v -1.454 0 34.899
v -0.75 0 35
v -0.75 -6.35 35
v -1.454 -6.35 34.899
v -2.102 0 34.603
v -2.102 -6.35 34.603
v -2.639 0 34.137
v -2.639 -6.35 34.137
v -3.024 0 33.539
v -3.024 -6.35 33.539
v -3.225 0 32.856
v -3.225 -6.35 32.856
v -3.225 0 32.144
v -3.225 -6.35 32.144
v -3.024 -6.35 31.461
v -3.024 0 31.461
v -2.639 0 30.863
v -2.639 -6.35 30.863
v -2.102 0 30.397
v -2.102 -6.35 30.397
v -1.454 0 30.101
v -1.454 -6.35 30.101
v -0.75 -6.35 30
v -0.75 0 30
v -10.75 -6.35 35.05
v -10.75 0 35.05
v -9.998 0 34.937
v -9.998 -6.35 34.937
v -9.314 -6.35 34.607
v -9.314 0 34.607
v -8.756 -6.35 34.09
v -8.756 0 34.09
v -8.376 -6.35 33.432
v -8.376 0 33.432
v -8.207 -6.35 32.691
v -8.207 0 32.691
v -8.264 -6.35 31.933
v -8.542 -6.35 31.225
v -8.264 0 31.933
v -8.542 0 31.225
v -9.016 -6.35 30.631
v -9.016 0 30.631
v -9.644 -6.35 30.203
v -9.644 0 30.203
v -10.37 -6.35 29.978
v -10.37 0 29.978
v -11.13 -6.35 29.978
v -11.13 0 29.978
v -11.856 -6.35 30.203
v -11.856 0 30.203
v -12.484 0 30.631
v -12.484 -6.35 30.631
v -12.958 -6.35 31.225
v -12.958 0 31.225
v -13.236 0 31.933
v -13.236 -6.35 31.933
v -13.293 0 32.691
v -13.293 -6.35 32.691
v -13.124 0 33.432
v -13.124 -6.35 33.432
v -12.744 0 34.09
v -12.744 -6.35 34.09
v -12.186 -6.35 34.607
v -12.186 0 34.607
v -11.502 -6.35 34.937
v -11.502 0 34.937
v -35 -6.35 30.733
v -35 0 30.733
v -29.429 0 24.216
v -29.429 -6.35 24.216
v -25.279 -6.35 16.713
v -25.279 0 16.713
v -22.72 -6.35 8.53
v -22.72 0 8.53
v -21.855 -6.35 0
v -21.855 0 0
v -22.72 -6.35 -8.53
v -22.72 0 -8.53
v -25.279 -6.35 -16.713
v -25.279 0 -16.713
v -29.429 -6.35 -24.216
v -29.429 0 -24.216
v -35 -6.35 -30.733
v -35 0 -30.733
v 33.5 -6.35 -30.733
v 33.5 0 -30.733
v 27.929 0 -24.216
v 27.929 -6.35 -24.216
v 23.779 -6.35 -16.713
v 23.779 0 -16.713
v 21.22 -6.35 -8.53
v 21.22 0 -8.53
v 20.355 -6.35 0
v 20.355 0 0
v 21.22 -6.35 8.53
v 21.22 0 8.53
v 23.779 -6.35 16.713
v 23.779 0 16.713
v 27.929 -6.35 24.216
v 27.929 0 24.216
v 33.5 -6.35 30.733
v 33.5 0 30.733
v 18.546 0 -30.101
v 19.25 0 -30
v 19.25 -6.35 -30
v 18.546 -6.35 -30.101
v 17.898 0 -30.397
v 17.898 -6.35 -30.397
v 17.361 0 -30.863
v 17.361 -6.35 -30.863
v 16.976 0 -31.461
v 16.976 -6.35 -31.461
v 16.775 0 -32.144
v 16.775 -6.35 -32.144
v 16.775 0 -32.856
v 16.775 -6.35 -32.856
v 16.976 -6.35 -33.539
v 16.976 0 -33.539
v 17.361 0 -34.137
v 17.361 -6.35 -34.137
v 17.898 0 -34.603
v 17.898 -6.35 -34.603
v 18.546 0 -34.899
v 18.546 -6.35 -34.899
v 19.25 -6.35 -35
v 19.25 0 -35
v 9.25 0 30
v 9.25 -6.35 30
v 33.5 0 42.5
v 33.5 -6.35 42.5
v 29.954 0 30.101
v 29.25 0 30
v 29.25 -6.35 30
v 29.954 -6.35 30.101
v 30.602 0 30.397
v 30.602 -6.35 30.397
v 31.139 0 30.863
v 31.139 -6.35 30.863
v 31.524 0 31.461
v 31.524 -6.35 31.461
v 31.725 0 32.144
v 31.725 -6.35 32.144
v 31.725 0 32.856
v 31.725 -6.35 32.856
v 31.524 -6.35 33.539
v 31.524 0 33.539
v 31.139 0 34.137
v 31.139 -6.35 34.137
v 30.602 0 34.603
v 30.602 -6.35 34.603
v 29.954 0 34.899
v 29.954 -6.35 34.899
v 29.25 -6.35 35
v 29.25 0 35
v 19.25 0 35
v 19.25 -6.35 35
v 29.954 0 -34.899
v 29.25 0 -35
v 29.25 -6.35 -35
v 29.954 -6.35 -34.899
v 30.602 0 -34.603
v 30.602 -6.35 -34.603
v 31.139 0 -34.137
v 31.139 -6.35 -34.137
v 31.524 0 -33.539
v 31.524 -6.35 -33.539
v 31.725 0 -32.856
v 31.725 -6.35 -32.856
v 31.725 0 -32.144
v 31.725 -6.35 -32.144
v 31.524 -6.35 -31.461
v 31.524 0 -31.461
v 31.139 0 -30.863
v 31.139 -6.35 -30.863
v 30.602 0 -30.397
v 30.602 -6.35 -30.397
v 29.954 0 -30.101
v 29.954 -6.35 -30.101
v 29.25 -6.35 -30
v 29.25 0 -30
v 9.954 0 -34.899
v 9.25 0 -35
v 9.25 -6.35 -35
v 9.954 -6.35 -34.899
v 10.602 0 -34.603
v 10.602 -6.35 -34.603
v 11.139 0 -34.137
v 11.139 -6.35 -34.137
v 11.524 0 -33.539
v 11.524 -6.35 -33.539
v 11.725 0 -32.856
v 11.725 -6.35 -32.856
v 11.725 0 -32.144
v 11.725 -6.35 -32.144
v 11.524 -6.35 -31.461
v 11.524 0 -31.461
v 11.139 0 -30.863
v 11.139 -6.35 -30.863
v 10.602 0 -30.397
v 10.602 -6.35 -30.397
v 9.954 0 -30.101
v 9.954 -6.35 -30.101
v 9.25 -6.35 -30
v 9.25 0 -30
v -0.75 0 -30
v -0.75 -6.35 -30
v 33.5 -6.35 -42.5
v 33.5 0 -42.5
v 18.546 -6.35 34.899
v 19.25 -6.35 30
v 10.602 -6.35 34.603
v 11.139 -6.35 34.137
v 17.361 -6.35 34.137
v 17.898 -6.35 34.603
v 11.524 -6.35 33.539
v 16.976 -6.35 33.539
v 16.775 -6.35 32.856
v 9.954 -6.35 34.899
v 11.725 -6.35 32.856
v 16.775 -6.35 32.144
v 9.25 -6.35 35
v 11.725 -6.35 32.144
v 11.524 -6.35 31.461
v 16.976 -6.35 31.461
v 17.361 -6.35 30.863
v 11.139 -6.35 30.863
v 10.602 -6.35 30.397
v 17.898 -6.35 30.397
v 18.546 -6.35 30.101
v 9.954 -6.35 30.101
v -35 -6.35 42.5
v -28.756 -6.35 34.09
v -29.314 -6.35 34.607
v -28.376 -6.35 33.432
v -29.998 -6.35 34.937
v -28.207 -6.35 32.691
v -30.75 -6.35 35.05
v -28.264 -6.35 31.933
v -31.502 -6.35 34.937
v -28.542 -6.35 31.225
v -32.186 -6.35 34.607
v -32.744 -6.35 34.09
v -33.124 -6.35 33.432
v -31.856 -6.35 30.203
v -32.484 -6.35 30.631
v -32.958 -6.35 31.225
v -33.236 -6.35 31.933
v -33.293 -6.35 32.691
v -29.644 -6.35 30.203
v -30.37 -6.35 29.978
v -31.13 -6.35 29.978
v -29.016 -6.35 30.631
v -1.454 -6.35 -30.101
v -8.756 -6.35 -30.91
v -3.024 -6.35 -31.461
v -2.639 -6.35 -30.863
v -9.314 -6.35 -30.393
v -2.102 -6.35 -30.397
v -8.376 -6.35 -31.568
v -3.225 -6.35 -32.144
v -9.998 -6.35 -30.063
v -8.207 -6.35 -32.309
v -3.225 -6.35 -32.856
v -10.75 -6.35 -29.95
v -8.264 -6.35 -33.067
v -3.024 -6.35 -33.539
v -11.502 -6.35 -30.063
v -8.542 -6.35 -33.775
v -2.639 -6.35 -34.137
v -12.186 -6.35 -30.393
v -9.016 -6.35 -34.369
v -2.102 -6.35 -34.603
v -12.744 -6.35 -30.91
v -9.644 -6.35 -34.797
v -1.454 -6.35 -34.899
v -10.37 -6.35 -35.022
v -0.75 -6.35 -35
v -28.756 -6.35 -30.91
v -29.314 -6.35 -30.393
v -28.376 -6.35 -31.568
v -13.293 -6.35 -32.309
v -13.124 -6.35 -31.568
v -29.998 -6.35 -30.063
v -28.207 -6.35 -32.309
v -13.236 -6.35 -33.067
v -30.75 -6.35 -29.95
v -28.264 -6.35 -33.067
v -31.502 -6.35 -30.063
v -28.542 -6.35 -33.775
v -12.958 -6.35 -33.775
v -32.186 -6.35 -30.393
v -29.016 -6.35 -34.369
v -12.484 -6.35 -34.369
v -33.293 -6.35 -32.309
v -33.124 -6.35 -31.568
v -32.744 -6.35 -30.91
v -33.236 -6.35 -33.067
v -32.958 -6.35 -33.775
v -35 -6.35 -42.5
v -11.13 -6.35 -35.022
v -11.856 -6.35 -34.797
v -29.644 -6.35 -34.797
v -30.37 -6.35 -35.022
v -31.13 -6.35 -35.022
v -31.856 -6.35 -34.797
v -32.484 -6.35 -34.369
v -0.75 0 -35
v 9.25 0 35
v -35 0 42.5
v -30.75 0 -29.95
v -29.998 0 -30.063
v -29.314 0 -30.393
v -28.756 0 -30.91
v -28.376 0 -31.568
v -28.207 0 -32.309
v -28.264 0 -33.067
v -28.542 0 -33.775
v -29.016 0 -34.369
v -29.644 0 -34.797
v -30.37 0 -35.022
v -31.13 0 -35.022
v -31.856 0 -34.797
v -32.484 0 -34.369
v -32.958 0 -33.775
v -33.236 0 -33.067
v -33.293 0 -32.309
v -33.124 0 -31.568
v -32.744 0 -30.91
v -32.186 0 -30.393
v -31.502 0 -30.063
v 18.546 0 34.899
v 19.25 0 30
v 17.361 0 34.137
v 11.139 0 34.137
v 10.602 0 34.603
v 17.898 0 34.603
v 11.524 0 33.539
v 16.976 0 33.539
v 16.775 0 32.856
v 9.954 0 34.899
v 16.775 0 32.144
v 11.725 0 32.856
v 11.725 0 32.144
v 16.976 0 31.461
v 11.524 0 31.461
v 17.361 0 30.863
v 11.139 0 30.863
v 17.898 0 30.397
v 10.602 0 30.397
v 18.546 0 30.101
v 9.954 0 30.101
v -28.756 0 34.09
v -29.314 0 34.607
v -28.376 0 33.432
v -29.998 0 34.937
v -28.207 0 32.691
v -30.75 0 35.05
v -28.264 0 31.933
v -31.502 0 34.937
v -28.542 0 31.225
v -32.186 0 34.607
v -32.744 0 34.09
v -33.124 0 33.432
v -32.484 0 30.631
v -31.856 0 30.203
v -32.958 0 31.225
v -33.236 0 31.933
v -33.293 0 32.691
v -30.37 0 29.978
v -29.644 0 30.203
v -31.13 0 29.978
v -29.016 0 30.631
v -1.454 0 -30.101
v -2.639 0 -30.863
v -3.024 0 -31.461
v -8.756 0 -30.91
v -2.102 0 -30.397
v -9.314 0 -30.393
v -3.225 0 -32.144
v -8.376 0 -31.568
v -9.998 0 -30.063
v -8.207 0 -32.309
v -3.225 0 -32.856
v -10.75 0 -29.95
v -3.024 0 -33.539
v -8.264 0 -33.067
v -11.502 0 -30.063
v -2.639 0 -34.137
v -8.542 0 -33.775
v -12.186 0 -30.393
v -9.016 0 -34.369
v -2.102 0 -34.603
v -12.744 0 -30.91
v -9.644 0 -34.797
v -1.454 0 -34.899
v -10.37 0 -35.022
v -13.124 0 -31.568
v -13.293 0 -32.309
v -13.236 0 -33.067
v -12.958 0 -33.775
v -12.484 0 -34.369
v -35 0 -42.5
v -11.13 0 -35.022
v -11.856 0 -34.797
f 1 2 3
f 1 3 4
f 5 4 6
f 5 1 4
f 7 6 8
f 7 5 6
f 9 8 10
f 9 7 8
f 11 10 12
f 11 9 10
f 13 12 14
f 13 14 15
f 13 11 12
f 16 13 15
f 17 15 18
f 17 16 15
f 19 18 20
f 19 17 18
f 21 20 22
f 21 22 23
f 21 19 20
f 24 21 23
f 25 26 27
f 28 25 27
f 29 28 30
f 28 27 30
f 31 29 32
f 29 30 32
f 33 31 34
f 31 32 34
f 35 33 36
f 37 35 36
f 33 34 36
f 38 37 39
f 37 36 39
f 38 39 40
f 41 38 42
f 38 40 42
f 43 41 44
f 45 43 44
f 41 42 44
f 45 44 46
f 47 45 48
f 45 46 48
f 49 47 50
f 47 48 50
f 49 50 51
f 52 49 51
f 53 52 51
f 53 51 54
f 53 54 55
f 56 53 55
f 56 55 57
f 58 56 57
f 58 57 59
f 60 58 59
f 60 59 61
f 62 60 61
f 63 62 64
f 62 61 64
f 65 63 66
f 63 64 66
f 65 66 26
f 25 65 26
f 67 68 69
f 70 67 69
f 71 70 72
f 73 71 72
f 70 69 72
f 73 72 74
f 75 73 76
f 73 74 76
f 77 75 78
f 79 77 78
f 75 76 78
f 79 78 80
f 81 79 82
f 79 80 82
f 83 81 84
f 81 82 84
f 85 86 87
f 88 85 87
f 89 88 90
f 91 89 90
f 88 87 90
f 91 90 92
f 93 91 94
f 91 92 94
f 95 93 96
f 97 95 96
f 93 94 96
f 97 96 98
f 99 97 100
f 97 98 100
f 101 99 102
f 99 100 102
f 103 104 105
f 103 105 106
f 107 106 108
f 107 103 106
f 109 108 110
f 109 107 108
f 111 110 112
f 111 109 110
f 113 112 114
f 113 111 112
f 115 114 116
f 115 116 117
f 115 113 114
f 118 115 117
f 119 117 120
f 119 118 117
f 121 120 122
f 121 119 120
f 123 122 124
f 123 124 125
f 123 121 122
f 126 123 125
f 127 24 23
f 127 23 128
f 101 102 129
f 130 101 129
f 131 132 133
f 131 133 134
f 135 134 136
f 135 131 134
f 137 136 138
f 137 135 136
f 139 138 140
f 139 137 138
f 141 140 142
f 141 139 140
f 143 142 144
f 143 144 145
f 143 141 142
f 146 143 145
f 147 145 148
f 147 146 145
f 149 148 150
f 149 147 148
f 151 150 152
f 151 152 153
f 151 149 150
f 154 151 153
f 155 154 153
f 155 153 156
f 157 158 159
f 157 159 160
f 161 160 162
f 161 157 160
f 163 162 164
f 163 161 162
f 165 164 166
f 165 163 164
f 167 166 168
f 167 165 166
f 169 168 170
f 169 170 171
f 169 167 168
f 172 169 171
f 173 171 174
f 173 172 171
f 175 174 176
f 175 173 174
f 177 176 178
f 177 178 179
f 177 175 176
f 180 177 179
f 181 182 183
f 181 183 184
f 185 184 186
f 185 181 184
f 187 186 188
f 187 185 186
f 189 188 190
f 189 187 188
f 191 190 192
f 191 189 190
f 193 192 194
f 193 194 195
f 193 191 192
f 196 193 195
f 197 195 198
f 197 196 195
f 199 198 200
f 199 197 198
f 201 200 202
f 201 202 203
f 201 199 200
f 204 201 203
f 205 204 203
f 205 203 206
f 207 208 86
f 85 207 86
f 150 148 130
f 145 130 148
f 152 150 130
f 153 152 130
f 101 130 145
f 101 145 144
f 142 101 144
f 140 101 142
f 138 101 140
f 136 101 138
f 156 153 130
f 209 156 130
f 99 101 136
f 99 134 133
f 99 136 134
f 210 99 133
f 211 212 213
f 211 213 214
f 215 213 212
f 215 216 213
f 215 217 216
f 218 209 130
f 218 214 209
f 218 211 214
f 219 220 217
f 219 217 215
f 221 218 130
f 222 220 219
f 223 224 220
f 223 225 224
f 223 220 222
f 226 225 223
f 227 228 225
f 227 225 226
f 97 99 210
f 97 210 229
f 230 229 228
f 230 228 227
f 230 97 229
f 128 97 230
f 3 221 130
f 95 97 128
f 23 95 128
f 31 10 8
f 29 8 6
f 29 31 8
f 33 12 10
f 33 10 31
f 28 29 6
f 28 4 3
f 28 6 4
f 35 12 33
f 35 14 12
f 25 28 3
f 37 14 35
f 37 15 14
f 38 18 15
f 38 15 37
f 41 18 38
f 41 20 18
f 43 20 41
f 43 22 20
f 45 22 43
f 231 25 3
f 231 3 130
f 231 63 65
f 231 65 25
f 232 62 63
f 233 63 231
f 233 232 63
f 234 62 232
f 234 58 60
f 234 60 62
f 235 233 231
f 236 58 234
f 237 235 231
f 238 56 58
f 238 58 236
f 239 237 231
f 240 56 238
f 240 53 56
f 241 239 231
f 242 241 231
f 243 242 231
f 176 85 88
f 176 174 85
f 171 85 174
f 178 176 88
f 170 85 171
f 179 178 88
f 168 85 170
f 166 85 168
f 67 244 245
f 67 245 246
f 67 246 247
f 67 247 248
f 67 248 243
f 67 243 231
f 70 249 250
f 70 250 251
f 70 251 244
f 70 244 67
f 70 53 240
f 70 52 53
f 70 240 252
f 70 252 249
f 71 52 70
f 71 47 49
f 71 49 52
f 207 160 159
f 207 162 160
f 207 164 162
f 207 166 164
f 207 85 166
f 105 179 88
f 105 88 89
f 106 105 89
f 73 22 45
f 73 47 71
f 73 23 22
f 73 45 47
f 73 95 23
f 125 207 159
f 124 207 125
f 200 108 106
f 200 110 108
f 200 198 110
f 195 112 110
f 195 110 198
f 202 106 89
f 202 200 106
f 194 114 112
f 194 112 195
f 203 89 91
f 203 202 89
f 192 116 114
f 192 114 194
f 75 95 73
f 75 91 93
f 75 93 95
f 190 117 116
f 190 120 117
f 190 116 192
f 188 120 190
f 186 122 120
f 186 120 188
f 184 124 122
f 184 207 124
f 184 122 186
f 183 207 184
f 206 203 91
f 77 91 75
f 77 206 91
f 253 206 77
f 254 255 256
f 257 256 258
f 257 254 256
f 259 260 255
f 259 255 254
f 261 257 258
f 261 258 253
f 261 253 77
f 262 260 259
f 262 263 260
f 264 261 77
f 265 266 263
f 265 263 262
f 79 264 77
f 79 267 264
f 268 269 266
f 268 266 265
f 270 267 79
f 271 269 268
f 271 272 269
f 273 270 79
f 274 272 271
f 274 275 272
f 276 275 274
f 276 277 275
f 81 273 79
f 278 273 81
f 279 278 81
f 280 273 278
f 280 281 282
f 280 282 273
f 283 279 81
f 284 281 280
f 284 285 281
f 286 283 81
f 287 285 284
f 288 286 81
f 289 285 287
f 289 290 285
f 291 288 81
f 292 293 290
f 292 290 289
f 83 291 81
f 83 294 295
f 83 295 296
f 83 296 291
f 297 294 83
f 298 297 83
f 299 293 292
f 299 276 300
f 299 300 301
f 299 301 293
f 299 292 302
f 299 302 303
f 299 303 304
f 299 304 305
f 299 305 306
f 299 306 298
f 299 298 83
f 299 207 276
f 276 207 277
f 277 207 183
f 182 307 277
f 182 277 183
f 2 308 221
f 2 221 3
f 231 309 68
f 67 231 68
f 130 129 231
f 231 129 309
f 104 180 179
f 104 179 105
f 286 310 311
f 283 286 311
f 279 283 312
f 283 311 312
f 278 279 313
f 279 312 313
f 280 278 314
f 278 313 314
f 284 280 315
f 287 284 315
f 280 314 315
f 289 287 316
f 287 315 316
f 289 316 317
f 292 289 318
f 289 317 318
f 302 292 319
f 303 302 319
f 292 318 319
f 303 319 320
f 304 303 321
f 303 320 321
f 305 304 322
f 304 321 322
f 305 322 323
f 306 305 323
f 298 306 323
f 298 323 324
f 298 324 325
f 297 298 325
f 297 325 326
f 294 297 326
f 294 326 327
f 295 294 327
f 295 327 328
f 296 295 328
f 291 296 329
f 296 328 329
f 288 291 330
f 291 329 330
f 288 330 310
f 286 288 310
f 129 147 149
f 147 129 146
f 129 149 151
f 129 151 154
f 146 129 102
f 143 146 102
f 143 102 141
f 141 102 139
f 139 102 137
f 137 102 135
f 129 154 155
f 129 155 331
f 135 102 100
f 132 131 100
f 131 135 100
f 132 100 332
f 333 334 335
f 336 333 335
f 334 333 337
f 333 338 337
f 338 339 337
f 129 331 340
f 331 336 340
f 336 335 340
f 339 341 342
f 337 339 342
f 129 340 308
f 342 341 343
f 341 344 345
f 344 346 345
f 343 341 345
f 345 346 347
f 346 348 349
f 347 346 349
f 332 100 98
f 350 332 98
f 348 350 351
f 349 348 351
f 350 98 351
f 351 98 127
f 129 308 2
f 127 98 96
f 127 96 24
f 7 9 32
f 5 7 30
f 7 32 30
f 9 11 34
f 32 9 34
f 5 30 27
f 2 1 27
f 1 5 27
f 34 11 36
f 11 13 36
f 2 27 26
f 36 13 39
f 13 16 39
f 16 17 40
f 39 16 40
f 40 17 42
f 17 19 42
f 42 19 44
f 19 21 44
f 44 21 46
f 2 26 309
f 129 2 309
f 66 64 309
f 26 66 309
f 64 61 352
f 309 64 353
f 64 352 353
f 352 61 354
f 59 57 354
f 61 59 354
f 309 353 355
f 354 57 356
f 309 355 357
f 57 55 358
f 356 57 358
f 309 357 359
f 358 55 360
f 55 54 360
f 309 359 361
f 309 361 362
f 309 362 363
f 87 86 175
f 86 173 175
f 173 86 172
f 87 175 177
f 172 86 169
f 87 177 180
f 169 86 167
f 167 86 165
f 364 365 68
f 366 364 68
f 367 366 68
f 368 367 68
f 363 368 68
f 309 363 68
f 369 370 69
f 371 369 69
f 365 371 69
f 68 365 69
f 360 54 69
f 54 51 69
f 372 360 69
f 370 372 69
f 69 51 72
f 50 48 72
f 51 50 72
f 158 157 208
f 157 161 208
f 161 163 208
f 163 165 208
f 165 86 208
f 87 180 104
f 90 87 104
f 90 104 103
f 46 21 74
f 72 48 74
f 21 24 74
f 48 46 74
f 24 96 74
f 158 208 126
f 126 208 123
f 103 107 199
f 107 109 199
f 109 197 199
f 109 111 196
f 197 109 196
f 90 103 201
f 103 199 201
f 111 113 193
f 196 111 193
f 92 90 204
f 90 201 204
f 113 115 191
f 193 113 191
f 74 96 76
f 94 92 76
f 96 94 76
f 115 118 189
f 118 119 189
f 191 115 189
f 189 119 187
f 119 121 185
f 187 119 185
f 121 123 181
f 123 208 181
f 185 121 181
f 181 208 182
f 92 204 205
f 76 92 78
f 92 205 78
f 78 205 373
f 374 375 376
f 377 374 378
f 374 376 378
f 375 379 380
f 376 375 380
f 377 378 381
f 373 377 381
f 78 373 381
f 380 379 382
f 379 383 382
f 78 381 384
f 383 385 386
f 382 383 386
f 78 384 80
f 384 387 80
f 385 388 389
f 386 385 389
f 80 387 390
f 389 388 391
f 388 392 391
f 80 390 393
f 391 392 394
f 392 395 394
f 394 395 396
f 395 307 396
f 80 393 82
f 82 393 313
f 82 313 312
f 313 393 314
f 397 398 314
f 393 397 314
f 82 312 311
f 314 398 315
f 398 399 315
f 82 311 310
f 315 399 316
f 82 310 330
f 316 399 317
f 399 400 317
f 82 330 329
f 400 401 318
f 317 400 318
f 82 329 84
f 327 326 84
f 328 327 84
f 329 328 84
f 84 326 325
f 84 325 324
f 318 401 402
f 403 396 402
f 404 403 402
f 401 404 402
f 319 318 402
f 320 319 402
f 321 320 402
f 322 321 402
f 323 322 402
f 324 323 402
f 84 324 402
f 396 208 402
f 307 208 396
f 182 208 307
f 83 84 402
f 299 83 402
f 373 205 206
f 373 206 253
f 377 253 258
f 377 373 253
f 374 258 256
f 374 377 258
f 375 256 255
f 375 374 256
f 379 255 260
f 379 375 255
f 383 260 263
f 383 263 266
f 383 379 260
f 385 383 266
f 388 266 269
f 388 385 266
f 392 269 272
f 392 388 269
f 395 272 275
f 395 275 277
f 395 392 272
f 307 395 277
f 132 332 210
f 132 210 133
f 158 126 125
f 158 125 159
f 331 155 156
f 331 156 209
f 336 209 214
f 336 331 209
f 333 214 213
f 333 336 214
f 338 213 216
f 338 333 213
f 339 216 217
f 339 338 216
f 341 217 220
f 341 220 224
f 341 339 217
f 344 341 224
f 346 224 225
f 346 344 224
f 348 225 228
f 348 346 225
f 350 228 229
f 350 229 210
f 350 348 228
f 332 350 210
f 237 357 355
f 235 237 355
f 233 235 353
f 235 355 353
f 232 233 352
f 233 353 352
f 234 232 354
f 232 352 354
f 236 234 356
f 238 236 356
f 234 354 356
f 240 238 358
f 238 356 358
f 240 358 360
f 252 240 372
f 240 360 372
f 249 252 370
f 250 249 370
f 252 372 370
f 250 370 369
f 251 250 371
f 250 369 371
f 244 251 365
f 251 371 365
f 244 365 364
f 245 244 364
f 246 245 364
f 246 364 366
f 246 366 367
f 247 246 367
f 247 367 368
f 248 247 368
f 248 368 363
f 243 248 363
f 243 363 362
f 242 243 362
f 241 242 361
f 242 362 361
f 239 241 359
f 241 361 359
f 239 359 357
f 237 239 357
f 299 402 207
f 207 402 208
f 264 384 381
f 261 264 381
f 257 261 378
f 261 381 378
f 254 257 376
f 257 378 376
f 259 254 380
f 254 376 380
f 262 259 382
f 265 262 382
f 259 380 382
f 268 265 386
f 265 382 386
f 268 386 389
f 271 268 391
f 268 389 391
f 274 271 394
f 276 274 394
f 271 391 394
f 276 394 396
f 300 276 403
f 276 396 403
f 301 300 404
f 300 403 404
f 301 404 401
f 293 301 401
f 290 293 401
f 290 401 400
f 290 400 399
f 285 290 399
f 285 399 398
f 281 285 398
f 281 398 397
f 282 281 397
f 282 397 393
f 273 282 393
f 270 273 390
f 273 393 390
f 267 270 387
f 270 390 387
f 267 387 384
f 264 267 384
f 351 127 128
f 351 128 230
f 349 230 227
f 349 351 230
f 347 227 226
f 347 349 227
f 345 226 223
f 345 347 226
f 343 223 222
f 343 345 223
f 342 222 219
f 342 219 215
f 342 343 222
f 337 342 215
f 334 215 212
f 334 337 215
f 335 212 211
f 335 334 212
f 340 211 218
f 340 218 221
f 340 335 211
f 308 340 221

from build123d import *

# Parameters (mm, degrees)
SKETCH1_R           = 2.55
BOSS_EXTRUDE1_DEPTH = 6.35


with BuildPart() as part:
    # Sketch1 → Boss-Extrude1 (new body)
    with BuildSketch(Plane(origin=(0, 0, 0), x_dir=(1, 0, 0), z_dir=(0, 1, 0))):
        with BuildLine():
            Line((0, -42.5), (-35, -42.5))
            Line((-35, -42.5), (-35, -30.733037331))
            ThreePointArc((-35, -30.733037331), (-21.855245126, 0), (-35, 30.733037331))
            Line((-35, 30.733037331), (-35, 42.5))
            Line((-35, 42.5), (0, 42.5))
            Line((0, 42.5), (33.5, 42.5))
            Line((33.5, 42.5), (33.5, 32.5))
            Line((33.5, 32.5), (33.5, 30.733037331))
            ThreePointArc((33.5, 30.733037331), (20.355245126, 0), (33.5, -30.733037331))
            Line((33.5, -30.733037331), (33.5, -32.5))
            Line((33.5, -32.5), (33.5, -42.5))
            Line((33.5, -42.5), (0, -42.5))
        make_face()
        with Locations(Location((-30.75, -32.5, 0), (0, 0, 270))):
            Circle(SKETCH1_R, mode=Mode.SUBTRACT)
        with Locations(Location((-30.75, 32.5, 0), (0, 0, 270))):
            Circle(SKETCH1_R, mode=Mode.SUBTRACT)
        with Locations(Location((-10.75, 32.5, 0), (0, 0, 270))):
            Circle(SKETCH1_R, mode=Mode.SUBTRACT)
        with Locations(Location((-10.75, -32.5, 0), (0, 0, 270))):
            Circle(SKETCH1_R, mode=Mode.SUBTRACT)
        with BuildLine():
            Line((29.25, -35), (19.25, -35))
            ThreePointArc((19.25, -35), (16.75, -32.5), (19.25, -30))
            Line((19.25, -30), (29.25, -30))
            ThreePointArc((29.25, -30), (31.75, -32.5), (29.25, -35))
        make_face(mode=Mode.SUBTRACT)
        with BuildLine():
            Line((9.25, -35), (-0.75, -35))
            ThreePointArc((-0.75, -35), (-3.25, -32.5), (-0.75, -30))
            Line((-0.75, -30), (9.25, -30))
            ThreePointArc((9.25, -30), (11.75, -32.5), (9.25, -35))
        make_face(mode=Mode.SUBTRACT)
        with BuildLine():
            Line((29.25, 30), (19.25, 30))
            ThreePointArc((19.25, 30), (16.75, 32.5), (19.25, 35))
            Line((19.25, 35), (29.25, 35))
            ThreePointArc((29.25, 35), (31.75, 32.5), (29.25, 30))
        make_face(mode=Mode.SUBTRACT)
        with BuildLine():
            Line((9.25, 30), (-0.75, 30))
            ThreePointArc((-0.75, 30), (-3.25, 32.5), (-0.75, 35))
            Line((-0.75, 35), (9.25, 35))
            ThreePointArc((9.25, 35), (11.75, 32.5), (9.25, 30))
        make_face(mode=Mode.SUBTRACT)
    extrude(amount=-BOSS_EXTRUDE1_DEPTH)


solid = part.part
